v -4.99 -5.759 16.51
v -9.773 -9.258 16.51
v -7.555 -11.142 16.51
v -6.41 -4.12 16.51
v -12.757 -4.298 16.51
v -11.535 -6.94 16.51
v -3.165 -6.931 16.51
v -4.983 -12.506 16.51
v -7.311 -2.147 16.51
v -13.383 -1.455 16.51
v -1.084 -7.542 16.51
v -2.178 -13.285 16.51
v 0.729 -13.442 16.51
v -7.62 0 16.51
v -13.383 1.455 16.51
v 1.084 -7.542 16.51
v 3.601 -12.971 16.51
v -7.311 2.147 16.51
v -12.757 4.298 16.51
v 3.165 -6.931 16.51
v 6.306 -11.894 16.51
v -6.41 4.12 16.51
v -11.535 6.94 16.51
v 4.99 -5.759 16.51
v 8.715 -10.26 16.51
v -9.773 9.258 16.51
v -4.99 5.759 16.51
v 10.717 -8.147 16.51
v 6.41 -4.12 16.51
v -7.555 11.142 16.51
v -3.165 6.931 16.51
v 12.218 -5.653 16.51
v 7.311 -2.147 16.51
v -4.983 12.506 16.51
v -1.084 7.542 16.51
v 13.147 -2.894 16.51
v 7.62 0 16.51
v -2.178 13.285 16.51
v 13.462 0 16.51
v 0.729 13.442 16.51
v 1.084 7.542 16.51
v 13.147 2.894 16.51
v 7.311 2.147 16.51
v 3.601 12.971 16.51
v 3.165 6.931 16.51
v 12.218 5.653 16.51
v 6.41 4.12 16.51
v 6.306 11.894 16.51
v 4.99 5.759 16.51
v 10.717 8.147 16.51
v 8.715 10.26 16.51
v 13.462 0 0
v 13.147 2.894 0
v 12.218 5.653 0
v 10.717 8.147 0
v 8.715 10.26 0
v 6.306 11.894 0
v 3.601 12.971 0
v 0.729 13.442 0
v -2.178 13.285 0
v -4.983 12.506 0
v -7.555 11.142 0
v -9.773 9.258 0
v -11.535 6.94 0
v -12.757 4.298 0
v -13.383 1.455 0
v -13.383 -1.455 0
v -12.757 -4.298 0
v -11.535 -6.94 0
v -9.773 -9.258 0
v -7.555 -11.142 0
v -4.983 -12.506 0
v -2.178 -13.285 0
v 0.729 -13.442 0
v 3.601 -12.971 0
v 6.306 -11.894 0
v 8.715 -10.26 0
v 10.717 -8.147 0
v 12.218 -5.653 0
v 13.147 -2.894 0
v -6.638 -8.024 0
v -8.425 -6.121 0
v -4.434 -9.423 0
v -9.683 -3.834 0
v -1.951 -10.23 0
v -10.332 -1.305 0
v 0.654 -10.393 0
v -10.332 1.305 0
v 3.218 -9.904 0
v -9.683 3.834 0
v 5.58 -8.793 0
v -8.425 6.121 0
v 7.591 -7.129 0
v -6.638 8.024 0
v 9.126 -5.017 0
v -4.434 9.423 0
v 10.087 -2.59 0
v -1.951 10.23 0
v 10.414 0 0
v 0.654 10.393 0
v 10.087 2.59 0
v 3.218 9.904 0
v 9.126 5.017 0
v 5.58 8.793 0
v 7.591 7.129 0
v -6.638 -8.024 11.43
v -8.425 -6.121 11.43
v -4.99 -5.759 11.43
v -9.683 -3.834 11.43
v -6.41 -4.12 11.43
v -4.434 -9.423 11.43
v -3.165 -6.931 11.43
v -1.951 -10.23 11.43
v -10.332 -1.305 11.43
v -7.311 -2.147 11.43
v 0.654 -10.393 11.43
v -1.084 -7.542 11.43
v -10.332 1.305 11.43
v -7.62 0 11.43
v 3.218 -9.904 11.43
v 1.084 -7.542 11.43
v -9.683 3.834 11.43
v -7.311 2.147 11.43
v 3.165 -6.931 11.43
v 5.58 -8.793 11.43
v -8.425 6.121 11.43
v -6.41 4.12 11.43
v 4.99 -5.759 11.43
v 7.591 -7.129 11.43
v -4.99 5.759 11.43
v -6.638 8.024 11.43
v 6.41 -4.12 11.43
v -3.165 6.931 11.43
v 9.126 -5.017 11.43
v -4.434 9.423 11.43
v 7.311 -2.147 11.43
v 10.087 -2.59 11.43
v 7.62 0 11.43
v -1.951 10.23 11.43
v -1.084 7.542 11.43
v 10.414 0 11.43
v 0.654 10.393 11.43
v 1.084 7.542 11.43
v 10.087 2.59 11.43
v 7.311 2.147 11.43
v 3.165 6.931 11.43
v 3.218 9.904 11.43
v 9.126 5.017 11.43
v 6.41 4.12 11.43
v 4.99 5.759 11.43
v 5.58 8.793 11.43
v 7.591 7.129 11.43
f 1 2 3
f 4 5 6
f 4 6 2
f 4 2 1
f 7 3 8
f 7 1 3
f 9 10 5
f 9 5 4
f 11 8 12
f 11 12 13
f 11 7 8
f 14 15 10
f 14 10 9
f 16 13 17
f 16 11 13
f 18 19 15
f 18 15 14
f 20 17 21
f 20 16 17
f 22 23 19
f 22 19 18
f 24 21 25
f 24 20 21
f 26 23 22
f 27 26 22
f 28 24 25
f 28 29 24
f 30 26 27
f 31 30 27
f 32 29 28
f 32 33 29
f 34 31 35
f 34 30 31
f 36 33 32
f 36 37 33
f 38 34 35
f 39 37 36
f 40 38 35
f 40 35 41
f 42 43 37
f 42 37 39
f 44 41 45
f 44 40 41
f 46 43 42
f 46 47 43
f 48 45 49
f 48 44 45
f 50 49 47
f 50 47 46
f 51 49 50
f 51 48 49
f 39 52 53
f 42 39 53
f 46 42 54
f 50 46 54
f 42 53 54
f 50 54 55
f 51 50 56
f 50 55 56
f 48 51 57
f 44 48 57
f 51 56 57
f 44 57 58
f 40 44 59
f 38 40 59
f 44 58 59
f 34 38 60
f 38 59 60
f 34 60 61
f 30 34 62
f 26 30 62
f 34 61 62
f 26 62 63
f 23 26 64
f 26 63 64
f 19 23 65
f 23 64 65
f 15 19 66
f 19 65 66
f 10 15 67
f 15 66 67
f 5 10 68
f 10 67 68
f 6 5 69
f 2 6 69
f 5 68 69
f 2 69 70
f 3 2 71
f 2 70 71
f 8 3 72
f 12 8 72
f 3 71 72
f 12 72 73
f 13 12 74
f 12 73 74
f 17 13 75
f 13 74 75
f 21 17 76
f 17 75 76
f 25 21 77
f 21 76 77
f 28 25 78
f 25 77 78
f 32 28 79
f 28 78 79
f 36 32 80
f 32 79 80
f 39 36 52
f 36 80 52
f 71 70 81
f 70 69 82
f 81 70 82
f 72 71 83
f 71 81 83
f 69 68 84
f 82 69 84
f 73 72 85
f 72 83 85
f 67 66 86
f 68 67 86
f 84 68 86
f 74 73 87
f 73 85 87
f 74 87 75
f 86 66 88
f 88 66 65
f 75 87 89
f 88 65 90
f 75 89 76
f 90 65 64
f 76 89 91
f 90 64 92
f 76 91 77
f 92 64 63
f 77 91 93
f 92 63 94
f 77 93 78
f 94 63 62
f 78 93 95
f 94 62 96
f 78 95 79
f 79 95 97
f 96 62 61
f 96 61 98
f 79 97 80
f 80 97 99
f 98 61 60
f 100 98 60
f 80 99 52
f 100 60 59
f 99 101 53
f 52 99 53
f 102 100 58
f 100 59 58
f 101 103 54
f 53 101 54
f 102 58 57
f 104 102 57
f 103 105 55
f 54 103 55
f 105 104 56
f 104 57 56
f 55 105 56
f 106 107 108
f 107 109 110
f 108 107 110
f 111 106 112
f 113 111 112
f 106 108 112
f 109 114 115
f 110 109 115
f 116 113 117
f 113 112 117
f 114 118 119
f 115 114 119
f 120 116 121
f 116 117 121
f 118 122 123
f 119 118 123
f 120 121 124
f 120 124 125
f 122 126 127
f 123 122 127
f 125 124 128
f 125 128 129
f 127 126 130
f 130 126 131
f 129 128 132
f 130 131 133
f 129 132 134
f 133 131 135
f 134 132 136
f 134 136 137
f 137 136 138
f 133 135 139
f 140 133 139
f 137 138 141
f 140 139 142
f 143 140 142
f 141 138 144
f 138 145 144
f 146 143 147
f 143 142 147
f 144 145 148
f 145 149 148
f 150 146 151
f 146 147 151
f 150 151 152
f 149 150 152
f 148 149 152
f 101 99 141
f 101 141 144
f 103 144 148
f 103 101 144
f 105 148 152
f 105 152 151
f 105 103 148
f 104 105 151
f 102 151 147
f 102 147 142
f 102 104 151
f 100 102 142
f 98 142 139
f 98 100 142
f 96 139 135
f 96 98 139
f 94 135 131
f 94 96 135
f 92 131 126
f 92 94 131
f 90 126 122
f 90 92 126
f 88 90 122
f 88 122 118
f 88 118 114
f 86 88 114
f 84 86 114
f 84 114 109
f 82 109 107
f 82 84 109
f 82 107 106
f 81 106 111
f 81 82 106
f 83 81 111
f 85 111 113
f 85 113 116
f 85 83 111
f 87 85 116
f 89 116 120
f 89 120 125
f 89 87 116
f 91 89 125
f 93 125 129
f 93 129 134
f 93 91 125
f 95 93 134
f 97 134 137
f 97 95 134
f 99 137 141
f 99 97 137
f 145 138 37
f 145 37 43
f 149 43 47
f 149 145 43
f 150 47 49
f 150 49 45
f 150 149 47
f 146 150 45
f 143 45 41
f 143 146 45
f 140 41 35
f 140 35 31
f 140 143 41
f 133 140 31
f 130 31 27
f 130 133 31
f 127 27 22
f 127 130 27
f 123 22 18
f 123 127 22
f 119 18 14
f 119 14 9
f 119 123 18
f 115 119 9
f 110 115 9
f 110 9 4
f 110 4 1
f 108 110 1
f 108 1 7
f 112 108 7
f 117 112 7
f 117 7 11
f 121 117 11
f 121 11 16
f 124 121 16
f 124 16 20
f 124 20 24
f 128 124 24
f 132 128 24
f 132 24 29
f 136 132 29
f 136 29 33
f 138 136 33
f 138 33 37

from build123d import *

# Parameters (mm, degrees)
SKETCH1_R           = 13.462
BOSS_EXTRUDE3_DEPTH = 16.51
SKETCH1_15_R        = 7.62
CUT_EXTRUDE3_DEPTH  = 16.51
SKETCH1_16_R        = 10.414
SKETCH1_16_R_2      = 7.62
CUT_EXTRUDE4_DEPTH  = 11.43


with BuildPart() as part:
    # Sketch1 → Boss-Extrude3 (new body)
    with BuildSketch(Plane.XY):
        Circle(SKETCH1_R)
    extrude(amount=BOSS_EXTRUDE3_DEPTH)

    # Sketch1<15> → Cut-Extrude3 (cut)
    with BuildSketch(Plane.XY):
        Circle(SKETCH1_15_R)
    extrude(amount=CUT_EXTRUDE3_DEPTH, mode=Mode.SUBTRACT)

    # Sketch1<16> → Cut-Extrude4 (cut)
    with BuildSketch(Plane.XY):
        Circle(SKETCH1_16_R)
        Circle(SKETCH1_16_R_2, mode=Mode.SUBTRACT)
    extrude(amount=CUT_EXTRUDE4_DEPTH, mode=Mode.SUBTRACT)


solid = part.part
